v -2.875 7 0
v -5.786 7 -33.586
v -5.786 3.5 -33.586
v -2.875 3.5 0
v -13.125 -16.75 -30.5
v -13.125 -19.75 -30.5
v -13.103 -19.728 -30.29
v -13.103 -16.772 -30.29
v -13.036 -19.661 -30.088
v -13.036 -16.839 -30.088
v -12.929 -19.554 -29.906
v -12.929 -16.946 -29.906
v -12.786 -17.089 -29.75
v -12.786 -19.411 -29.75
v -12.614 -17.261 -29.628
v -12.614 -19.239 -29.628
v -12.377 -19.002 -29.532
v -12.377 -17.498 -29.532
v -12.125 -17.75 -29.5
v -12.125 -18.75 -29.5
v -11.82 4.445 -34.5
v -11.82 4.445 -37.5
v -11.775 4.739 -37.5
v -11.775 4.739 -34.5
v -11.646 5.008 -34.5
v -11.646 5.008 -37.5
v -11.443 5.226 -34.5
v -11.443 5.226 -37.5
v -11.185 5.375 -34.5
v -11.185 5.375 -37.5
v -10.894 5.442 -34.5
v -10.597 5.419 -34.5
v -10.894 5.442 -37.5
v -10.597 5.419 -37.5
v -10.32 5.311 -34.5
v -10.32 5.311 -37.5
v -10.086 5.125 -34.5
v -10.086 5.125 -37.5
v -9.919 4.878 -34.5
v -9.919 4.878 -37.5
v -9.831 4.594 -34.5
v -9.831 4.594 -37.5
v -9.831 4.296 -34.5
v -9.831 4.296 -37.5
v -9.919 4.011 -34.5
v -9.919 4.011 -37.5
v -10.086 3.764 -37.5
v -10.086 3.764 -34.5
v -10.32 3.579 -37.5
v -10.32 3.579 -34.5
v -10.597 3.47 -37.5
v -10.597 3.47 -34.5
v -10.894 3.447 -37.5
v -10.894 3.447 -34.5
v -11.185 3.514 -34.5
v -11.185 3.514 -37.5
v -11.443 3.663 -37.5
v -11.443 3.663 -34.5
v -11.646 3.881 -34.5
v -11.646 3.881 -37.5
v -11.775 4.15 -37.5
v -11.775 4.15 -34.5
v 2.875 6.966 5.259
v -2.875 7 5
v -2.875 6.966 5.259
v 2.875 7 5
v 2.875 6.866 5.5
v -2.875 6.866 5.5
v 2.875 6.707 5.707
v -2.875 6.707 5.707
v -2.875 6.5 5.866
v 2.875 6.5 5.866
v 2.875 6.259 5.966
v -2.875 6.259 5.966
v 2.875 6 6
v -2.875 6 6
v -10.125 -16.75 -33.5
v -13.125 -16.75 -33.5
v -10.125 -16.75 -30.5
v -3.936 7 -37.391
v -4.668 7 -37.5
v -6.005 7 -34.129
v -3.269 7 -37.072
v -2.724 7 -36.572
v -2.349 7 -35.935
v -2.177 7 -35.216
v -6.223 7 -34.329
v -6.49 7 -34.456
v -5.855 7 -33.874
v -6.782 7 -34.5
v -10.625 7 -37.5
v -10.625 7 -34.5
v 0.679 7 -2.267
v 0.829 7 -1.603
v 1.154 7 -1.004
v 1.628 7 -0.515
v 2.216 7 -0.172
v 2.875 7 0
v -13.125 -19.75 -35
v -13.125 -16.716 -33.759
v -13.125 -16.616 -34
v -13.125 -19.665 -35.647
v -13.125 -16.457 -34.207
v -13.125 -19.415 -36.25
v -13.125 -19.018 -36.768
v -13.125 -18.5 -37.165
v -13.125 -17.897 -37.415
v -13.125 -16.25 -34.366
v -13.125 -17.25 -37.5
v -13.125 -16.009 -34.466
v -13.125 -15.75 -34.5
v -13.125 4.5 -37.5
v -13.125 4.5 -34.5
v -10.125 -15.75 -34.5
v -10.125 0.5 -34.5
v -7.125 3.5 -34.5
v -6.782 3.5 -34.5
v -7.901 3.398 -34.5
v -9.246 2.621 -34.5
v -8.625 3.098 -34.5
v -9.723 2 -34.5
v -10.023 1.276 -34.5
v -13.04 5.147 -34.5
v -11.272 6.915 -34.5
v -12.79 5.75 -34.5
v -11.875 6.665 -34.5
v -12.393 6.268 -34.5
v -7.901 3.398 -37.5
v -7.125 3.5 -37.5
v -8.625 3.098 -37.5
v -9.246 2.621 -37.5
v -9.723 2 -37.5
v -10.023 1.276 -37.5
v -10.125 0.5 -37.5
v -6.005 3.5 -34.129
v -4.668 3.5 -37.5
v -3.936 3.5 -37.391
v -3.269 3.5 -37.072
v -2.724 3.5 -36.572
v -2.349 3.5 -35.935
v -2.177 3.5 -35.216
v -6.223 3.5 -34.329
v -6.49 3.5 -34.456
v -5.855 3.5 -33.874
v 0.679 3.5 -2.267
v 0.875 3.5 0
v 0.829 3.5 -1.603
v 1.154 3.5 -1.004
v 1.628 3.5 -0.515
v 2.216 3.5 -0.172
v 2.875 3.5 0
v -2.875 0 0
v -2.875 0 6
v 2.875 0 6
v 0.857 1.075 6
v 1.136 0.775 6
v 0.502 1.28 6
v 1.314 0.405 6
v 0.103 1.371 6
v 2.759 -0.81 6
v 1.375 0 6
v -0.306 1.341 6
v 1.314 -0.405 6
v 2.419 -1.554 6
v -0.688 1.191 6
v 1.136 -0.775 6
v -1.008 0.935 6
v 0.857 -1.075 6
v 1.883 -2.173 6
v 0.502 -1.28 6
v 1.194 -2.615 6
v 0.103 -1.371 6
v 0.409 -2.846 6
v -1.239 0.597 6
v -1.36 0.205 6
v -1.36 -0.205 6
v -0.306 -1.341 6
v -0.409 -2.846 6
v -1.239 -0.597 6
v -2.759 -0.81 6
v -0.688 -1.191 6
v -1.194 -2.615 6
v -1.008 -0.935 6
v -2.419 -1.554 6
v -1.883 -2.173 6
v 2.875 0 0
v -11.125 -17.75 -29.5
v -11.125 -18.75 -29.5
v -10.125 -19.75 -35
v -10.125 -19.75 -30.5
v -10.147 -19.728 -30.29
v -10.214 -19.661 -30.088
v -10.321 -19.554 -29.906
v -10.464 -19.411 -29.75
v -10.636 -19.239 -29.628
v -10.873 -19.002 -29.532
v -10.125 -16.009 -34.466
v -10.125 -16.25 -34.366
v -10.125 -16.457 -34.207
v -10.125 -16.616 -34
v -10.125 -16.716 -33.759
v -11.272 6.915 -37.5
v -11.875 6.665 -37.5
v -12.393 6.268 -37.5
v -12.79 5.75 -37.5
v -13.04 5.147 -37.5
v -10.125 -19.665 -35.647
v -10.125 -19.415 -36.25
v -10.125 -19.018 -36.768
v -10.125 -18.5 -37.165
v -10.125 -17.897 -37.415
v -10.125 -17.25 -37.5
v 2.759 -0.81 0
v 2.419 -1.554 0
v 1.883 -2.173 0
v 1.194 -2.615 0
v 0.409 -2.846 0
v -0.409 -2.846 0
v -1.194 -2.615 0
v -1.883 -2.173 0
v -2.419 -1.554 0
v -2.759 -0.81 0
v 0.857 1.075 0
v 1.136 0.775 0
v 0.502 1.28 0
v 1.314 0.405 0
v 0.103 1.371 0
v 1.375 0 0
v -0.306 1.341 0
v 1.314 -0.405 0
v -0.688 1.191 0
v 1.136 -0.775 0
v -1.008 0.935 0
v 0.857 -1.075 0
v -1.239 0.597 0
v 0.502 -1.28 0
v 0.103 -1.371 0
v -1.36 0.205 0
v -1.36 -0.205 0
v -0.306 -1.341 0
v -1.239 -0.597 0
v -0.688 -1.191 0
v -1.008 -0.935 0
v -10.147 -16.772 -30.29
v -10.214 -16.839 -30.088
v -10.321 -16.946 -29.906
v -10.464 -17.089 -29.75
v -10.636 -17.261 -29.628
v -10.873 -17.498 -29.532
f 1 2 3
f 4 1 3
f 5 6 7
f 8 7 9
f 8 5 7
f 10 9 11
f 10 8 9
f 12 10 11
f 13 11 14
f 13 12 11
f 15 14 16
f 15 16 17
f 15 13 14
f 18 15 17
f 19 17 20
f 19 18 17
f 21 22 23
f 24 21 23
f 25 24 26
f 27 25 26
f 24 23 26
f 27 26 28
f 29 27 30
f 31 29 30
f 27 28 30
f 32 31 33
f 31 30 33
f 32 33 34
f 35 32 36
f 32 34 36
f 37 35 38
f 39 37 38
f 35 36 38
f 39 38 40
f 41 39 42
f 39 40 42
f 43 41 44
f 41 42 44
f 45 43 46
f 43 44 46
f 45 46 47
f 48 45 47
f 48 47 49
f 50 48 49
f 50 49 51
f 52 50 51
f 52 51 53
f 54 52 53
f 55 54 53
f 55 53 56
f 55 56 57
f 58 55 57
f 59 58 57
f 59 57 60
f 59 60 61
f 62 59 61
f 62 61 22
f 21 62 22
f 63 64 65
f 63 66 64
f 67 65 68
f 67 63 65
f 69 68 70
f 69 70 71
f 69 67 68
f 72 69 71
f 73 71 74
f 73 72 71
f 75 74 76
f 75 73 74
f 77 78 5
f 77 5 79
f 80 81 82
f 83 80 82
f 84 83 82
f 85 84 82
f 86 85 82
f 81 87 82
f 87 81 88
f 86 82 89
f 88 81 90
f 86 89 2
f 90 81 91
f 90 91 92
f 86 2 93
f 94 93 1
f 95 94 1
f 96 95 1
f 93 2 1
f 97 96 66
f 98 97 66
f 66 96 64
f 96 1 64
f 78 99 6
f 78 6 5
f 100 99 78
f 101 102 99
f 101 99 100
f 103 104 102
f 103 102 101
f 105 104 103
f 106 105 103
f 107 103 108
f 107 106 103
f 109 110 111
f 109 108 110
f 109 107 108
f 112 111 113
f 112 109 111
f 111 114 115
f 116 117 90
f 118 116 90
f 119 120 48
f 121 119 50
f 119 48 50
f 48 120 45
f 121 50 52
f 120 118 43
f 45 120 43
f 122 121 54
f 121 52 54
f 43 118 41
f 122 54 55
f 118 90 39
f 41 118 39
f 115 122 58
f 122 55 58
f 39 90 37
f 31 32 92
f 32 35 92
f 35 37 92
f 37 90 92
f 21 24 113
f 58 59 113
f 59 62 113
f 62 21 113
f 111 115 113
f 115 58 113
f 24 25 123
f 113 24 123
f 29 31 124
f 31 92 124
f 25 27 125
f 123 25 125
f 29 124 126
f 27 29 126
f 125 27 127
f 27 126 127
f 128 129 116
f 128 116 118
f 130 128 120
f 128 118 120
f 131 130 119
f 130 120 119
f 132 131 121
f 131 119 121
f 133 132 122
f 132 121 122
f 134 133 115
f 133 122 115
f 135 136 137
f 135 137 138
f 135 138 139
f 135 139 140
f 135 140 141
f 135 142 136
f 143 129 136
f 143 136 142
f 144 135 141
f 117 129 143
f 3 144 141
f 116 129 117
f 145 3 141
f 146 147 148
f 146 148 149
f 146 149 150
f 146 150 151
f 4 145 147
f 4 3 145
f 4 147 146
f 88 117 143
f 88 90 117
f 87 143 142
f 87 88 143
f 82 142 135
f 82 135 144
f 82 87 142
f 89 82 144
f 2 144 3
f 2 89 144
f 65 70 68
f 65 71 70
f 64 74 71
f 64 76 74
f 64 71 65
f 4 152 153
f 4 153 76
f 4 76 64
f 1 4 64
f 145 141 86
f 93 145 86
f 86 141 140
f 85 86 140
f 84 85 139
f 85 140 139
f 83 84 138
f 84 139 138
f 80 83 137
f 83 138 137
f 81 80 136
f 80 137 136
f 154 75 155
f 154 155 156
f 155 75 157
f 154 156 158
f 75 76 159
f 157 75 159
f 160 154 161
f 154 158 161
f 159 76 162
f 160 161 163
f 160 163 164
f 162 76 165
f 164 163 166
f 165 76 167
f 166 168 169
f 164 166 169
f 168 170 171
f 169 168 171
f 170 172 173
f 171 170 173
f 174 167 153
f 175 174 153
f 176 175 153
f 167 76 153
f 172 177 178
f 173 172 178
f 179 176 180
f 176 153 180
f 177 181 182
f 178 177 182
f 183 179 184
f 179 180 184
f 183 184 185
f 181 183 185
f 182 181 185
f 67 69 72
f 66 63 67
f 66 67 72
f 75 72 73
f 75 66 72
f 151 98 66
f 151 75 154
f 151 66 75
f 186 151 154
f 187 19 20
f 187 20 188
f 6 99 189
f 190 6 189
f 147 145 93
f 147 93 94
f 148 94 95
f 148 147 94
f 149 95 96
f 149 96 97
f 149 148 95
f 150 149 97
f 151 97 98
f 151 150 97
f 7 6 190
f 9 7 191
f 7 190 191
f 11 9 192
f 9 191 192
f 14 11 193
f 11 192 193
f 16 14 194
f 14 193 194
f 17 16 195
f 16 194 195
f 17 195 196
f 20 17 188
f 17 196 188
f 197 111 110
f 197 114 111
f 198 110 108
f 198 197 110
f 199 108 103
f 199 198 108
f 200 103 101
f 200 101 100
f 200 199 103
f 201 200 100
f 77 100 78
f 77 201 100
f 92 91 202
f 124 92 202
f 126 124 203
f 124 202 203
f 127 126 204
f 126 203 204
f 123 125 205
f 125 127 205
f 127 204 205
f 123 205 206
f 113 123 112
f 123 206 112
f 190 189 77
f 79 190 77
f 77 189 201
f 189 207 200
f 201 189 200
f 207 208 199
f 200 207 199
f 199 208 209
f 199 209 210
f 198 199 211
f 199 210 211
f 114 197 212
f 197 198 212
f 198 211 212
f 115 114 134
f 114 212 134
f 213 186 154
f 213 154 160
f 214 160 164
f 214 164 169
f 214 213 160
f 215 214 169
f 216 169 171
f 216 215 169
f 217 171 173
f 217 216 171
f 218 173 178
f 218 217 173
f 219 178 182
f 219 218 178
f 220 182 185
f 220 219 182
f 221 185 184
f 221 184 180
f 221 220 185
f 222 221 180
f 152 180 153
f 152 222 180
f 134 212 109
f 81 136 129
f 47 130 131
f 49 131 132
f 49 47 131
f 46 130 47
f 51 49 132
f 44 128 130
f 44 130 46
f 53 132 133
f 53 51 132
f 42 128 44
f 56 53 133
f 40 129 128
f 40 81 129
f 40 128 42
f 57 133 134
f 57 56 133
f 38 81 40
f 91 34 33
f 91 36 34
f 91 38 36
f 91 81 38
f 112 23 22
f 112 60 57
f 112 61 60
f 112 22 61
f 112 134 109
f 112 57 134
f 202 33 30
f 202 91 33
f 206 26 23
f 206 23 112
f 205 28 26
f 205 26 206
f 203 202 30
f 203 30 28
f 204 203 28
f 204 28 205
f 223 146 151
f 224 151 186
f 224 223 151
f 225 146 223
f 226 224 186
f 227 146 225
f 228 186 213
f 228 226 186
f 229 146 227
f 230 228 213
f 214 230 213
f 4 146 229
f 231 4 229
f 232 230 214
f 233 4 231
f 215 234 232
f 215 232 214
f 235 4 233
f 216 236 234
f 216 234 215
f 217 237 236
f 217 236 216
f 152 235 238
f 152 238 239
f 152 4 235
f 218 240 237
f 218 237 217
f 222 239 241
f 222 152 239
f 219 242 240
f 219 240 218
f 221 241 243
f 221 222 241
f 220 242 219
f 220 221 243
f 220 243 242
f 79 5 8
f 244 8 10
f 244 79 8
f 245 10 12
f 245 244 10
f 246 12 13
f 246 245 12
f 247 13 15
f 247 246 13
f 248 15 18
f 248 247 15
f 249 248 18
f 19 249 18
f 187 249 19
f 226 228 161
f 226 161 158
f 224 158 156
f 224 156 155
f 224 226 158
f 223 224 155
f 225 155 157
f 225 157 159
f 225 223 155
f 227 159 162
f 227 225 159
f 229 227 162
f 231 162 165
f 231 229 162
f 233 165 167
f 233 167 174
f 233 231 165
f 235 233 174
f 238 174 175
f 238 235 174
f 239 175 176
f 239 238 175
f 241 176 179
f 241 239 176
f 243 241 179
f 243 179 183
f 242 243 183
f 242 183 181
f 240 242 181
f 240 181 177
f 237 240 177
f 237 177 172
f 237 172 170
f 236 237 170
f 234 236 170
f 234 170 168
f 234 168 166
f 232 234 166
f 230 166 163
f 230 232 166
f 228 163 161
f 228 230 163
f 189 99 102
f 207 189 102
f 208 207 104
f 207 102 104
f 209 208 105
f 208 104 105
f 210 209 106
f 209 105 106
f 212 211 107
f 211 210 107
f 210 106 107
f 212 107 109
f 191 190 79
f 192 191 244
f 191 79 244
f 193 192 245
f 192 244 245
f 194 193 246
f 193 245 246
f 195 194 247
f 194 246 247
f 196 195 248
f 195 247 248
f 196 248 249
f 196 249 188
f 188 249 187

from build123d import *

# Parameters (mm, degrees)
SKETCH1_R           = 1.375
BOSS_EXTRUDE1_DEPTH = 6
BOSS_EXTRUDE2_START = -13.125
SKETCH9_W           = 3.5
SKETCH9_H           = 3
BOSS_EXTRUDE2_DEPTH = 7.26
BOSS_EXTRUDE3_START = -3.5
SKETCH10_W          = 3
SKETCH10_H          = 3
BOSS_EXTRUDE3_DEPTH = 23.25
SKETCH11_W          = 3
SKETCH11_H          = 3
BOSS_EXTRUDE4_DEPTH = 5
FILLET1_R           = 2.5
FILLET2_R           = 1
FILLET3_R           = 3
CUT_EXTRUDE1_REACH  = 51.544
SKETCH12_R          = 1


with BuildPart() as part:
    # Sketch1 → Boss-Extrude1 (new body)
    with BuildSketch(Plane(origin=(0, 0, 0), x_dir=(0, 1, 0), z_dir=(0, 0, 1))):
        with BuildLine():
            Line((0, 2.875), (7, 2.875))
            Line((7, 2.875), (7, -2.875))
            Line((7, -2.875), (0, -2.875))
            ThreePointArc((0, -2.875), (-2.875, 0), (0, 2.875))
        make_face()
        with Locations(Location((0, 0, 0), (0, 0, 270))):
            Circle(SKETCH1_R, mode=Mode.SUBTRACT)
    extrude(amount=BOSS_EXTRUDE1_DEPTH)

    # Sketch2 → Loft1 section 0
    with BuildSketch(Plane(origin=(0, 0, 0), x_dir=(1, 0, 0), z_dir=(0, 0, -1))):
        with BuildLine():
            Line((0.875, -7), (-2.875, -7))
            Line((-2.875, -7), (-2.875, -3.5))
            Line((-2.875, -3.5), (0.875, -3.5))
            Line((0.875, -3.5), (0.875, -7))
        make_face()
    # Sketch8 → Loft1 section 1
    with BuildSketch(Plane(origin=(0, 0, -37.5), x_dir=(-1, 0, 0), z_dir=(0, 0, -1))):
        with BuildLine():
            Line((2.375, 3.5), (2.375, 7))
            Line((2.375, 7), (6.125, 7))
            Line((6.125, 7), (6.125, 3.5))
            Line((6.125, 3.5), (2.375, 3.5))
        make_face()
    loft()

    # Sketch9 → Boss-Extrude2 (add)
    with BuildSketch(Plane.YZ.offset(BOSS_EXTRUDE2_START)):
        with Locations((5.25, -36)):
            Rectangle(SKETCH9_W, SKETCH9_H)
    extrude(amount=BOSS_EXTRUDE2_DEPTH)

    # Sketch10 → Boss-Extrude3 (add)
    with BuildSketch(Plane(origin=(0, 7, 0), x_dir=(-1, 0, 0), z_dir=(0, 1, 0)).offset(BOSS_EXTRUDE3_START)):
        with Locations((11.625, -36)):
            Rectangle(SKETCH10_W, SKETCH10_H)
    extrude(amount=-BOSS_EXTRUDE3_DEPTH)

    # Sketch11 → Boss-Extrude4 (add)
    with BuildSketch(Plane.XY.offset(-34.5)):
        with Locations((-11.625, -18.25)):
            Rectangle(SKETCH11_W, SKETCH11_H)
    extrude(amount=BOSS_EXTRUDE4_DEPTH)

    # Fillet1
    # the kernel refuses this fillet: 2.5 mm, written as the material it adds along each edge
    with BuildSketch(Plane(origin=(0.875, 3.5, 0), x_dir=(-0.08634300732914678, 0, -0.9962654691824658), z_dir=(0, 1, 0))) as fillet1_piece_1:
        with BuildLine():
            CenterArc((2.275267243, -2.5), FILLET1_R, 90, 78.288278187)
            Line((-0.172686015, -1.992530938), (0, 0))
            Line((0, 0), (2.275267243, 0))
        make_face()
    extrude(amount=3.5)
    # the kernel refuses this fillet: 2.5 mm, written as the material it takes off along each edge
    with BuildSketch(Plane(origin=(-19.375, -19.75, -37.5), x_dir=(0, 0, 1), z_dir=(1, 0, 0))) as fillet1_2_piece_1:
        with BuildLine():
            CenterArc((FILLET1_R, -FILLET1_R), FILLET1_R, 90, 90)
            Line((0, -FILLET1_R), (0, 0))
            Line((0, 0), (FILLET1_R, 0))
        make_face()
    extrude(amount=15.5, mode=Mode.SUBTRACT)
    with BuildSketch(Plane(origin=(-2.375, -2.231761645, -37.5), x_dir=(-1, 0, 0), z_dir=(0, 1, 0))) as fillet1_2_piece_2:
        with BuildLine():
            CenterArc((FILLET1_R * 0.917081863151, FILLET1_R), FILLET1_R, 184.953257478, 85.046742522)
            Line((-FILLET1_R * 0.0791836060315, FILLET1_R * 0.913656992671), (0, 0))
            Line((0, 0), (FILLET1_R * 0.917081863151, 0))
        make_face()
    extrude(amount=14.963523289, mode=Mode.SUBTRACT)
    with BuildSketch(Plane(origin=(-13.125, 7, -43.75), x_dir=(0, -1, 0), z_dir=(0, 0, 1))) as fillet1_2_piece_3:
        with BuildLine():
            CenterArc((FILLET1_R, FILLET1_R), FILLET1_R, 180, 90)
            Line((0, FILLET1_R), (0, 0))
            Line((0, 0), (FILLET1_R, 0))
        make_face()
    extrude(amount=15.5, mode=Mode.SUBTRACT)

    # Fillet2
    fillet2_edges = [part.edges().sort_by_distance(p)[0] for p in [
        (0, 7, 6),
        (-5.865, 5.25, -34.5),
        (-11.625, -16.75, -34.5),
        (-11.625, -16.75, -29.5),
        (-13.125, -18.25, -29.5),
        (-11.625, -19.75, -29.5),
        (-10.125, -18.25, -29.5),
    ]]
    fillet(fillet2_edges, radius=FILLET2_R)

    # Fillet3
    fillet3_edges = [part.edges().sort_by_distance(p)[0] for p in [
        (-10.125, 3.5, -36),
    ]]
    fillet(fillet3_edges, radius=FILLET3_R)

    # Sketch12 → Cut-Extrude1 (cut, up to next)
    with BuildSketch(Plane(origin=(0, 0, -37.5), x_dir=(1, 0, 0), z_dir=(0, 0, -1)), mode=Mode.PRIVATE) as cut_extrude1_sk1:
        with Locations(Location((-10.819543648, -4.444543648, 0), (0, 0, 180))):
            Circle(SKETCH12_R)
    cut_extrude1_tool1 = extrude(cut_extrude1_sk1.sketch, amount=-CUT_EXTRUDE1_REACH, mode=Mode.PRIVATE) & part.part
    add(cut_extrude1_tool1.solids().sort_by_distance((-10.819544, 4.444544, -37.5))[0], mode=Mode.SUBTRACT)


solid = part.part
